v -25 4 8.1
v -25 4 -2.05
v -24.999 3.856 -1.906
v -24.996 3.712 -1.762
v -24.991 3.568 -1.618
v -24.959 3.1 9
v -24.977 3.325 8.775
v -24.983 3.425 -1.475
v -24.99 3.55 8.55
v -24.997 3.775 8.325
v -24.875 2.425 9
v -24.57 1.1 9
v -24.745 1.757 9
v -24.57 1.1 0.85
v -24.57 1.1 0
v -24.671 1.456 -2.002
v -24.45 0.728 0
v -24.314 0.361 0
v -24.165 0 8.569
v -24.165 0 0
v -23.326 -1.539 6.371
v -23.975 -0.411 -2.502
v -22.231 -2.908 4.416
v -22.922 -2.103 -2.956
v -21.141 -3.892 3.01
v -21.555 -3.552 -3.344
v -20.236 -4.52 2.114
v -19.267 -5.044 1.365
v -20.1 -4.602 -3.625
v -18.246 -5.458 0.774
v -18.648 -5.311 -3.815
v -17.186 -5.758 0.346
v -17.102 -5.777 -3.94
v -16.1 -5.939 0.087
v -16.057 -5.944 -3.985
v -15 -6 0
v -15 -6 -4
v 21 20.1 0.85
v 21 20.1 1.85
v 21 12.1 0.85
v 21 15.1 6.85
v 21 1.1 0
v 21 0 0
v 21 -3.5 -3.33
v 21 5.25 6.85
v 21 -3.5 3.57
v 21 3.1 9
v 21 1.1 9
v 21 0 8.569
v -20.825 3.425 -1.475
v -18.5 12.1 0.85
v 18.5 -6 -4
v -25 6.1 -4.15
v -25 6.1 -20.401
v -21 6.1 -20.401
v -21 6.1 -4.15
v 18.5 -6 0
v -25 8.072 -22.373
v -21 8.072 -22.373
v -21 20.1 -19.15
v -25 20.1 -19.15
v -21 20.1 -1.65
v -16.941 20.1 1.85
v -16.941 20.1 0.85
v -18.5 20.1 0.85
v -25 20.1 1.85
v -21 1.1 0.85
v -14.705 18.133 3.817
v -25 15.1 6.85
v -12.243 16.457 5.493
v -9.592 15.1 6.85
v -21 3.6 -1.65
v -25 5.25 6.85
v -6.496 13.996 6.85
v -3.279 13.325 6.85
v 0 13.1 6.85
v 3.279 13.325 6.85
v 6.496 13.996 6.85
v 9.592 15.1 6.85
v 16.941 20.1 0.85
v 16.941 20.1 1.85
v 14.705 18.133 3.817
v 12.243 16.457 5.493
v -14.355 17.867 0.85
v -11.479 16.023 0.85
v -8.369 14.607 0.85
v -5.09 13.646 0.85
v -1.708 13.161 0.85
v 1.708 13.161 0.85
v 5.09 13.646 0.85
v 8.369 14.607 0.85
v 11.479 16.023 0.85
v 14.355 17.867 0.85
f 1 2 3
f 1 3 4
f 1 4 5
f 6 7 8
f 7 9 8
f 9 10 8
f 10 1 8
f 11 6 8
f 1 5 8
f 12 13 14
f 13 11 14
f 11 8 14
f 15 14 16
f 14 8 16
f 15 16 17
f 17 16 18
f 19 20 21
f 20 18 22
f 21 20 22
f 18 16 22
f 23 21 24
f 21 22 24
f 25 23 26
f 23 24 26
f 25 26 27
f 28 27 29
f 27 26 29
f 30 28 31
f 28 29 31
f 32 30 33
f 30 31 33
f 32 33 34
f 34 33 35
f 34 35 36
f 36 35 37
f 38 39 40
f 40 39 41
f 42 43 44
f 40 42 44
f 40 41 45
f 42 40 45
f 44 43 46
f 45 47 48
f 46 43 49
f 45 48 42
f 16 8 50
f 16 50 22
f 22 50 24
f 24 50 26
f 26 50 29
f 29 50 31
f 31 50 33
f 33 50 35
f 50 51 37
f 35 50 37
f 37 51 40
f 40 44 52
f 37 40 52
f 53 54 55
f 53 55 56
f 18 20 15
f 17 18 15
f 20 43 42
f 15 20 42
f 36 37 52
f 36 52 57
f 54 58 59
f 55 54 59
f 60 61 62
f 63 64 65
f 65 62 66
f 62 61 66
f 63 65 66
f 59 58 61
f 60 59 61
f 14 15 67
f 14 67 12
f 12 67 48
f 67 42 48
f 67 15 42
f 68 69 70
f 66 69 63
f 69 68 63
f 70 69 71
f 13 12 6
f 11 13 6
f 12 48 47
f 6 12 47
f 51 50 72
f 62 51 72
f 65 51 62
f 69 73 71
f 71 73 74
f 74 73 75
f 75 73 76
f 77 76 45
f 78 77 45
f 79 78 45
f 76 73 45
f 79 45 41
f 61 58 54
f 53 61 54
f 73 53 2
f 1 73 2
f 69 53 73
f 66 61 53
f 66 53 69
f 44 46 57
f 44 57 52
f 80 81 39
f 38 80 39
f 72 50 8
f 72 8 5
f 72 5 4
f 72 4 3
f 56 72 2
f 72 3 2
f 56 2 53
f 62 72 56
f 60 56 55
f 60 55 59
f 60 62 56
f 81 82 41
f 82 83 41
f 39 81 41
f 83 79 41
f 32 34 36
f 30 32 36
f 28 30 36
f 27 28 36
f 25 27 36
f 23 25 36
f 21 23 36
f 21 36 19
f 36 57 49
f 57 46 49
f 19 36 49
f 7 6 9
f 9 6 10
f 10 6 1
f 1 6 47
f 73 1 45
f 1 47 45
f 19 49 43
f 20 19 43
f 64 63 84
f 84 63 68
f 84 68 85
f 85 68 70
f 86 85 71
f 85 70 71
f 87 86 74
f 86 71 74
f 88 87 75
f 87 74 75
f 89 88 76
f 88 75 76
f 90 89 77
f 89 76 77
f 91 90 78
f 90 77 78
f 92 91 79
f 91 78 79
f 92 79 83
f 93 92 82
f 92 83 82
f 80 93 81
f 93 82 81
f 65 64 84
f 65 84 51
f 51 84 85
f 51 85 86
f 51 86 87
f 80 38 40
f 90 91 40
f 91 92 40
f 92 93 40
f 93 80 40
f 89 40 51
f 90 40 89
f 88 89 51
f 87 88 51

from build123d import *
from OCP.BRepFilletAPI import BRepFilletAPI_MakeChamfer

# Parameters (mm, degrees)
BOSS_EXTRUDE1_DEPTH  = 21
BOSS_EXTRUDE4_DEPTH  = 6
CHAMFER4_SIZE        = 5
BOSS_EXTRUDE5_DEPTH  = 4
BOSS_EXTRUDE10_DEPTH = 4
FILLET1_R            = 10
CHAMFER5_SIZE        = 2.5
CHAMFER5_SIZE2       = 2.041241452


with BuildPart() as part:
    # Sketch1 → Boss-Extrude1 (new, symmetric)
    with BuildSketch(Plane(origin=(0, 0, 0), x_dir=(0, 0, -1), z_dir=(1, 0, 0))):
        Polygon((0, -6), (4, -6), (-0.849880383, 12.1), (-6.849880383, 12.1), (-6.849880383, 5.250119617), (-9, 3.1), (-9, 1.1), (0, 1.1), (0, 0), (-8.56888804, 0), align=None)
    extrude(amount=BOSS_EXTRUDE1_DEPTH, both=True)

    # Sketch7 → Boss-Extrude4 (add)
    with BuildSketch(Plane.XY.offset(6.849880383)):
        with BuildLine():
            Line((-21, 12.1), (-21, 20.1))
            Line((-21, 20.1), (-16.941074346, 20.1))
            ThreePointArc((-16.941074346, 20.1), (0, 13.1), (16.941074346, 20.1))
            Line((16.941074346, 20.1), (21, 20.1))
            Line((21, 20.1), (21, 12.1))
            Line((21, 12.1), (-21, 12.1))
        make_face()
    extrude(amount=-BOSS_EXTRUDE4_DEPTH)

    # Chamfer4
    chamfer4_edges = [part.edges().sort_by_distance(p)[0] for p in [
        (-18.970537173, 20.1, 6.849880383),
        (18.970537173, 20.1, 6.849880383),
    ]]
    chamfer(chamfer4_edges, length=CHAMFER4_SIZE)

    # Sketch15 → Boss-Extrude5 (add)
    with BuildSketch(Plane.ZY.offset(21)):
        Polygon((9, 1.1), (9, 3.1), (6.849880383, 5.250119617), (6.849880383, 15.1), (1.849880383, 20.1), (0.849880383, 20.1), (0.849880383, 12.1), (-4, -6), (0, -6), (8.56888804, 0), (0, 0), (0, 1.1), align=None)
    extrude(amount=BOSS_EXTRUDE5_DEPTH)

    # Sketch22 → Boss-Extrude10 (add)
    with BuildSketch(Plane.ZY.offset(25)):
        Polygon((0.849880383, 6.1), (0.849880383, 1.1), (-4.150119617, 6.1), (-19.150119617, 6.1), (-22.901408311, 6.1), (-19.150119617, 20.1), (0.849880383, 20.1), align=None)
    extrude(amount=-BOSS_EXTRUDE10_DEPTH)

    # Fillet1
    # the kernel refuses this fillet: 10 mm, written as the material it takes off along each edge
    with BuildSketch(Plane(origin=(-25, -6, -29), x_dir=(1, 0, 0), z_dir=(0, 0, 1))) as fillet1_piece_1:
        with BuildLine():
            CenterArc((FILLET1_R, FILLET1_R), FILLET1_R, 180, 90)
            Line((0, FILLET1_R), (0, 0))
            Line((0, 0), (FILLET1_R, 0))
        make_face()
    extrude(amount=54, mode=Mode.SUBTRACT)

    # Chamfer5: one chamfer whose edges measure the first distance from different faces: ONE call of the kernel's chamfer builder (chamfer() names one face for all edges)
    chamfer5_edges_1 = [part.edges().sort_by_distance(p)[0] for p in [
        (21, -6, -2),
        (-21, 16.1, 0.849880383),
    ]]
    chamfer5_edges_2 = [part.edges().sort_by_distance(p)[0] for p in [
        (-23, 6.1, -22.901408311),
    ]]
    chamfer5_side_2 = [part.faces().sort_by_distance(p)[0] for p in [
        (-23, 6.1, -13.525763964),
    ]]
    chamfer5 = BRepFilletAPI_MakeChamfer(part.part.solid().wrapped)
    for e in chamfer5_edges_1:
        chamfer5.Add(CHAMFER5_SIZE, e.wrapped)
    for e in chamfer5_edges_2:
        chamfer5.Add(CHAMFER5_SIZE, CHAMFER5_SIZE2, e.wrapped, chamfer5_side_2[0].wrapped)  # the first distance lies on this face
    add(Compound.cast(chamfer5.Shape()), mode=Mode.REPLACE)


solid = part.part
